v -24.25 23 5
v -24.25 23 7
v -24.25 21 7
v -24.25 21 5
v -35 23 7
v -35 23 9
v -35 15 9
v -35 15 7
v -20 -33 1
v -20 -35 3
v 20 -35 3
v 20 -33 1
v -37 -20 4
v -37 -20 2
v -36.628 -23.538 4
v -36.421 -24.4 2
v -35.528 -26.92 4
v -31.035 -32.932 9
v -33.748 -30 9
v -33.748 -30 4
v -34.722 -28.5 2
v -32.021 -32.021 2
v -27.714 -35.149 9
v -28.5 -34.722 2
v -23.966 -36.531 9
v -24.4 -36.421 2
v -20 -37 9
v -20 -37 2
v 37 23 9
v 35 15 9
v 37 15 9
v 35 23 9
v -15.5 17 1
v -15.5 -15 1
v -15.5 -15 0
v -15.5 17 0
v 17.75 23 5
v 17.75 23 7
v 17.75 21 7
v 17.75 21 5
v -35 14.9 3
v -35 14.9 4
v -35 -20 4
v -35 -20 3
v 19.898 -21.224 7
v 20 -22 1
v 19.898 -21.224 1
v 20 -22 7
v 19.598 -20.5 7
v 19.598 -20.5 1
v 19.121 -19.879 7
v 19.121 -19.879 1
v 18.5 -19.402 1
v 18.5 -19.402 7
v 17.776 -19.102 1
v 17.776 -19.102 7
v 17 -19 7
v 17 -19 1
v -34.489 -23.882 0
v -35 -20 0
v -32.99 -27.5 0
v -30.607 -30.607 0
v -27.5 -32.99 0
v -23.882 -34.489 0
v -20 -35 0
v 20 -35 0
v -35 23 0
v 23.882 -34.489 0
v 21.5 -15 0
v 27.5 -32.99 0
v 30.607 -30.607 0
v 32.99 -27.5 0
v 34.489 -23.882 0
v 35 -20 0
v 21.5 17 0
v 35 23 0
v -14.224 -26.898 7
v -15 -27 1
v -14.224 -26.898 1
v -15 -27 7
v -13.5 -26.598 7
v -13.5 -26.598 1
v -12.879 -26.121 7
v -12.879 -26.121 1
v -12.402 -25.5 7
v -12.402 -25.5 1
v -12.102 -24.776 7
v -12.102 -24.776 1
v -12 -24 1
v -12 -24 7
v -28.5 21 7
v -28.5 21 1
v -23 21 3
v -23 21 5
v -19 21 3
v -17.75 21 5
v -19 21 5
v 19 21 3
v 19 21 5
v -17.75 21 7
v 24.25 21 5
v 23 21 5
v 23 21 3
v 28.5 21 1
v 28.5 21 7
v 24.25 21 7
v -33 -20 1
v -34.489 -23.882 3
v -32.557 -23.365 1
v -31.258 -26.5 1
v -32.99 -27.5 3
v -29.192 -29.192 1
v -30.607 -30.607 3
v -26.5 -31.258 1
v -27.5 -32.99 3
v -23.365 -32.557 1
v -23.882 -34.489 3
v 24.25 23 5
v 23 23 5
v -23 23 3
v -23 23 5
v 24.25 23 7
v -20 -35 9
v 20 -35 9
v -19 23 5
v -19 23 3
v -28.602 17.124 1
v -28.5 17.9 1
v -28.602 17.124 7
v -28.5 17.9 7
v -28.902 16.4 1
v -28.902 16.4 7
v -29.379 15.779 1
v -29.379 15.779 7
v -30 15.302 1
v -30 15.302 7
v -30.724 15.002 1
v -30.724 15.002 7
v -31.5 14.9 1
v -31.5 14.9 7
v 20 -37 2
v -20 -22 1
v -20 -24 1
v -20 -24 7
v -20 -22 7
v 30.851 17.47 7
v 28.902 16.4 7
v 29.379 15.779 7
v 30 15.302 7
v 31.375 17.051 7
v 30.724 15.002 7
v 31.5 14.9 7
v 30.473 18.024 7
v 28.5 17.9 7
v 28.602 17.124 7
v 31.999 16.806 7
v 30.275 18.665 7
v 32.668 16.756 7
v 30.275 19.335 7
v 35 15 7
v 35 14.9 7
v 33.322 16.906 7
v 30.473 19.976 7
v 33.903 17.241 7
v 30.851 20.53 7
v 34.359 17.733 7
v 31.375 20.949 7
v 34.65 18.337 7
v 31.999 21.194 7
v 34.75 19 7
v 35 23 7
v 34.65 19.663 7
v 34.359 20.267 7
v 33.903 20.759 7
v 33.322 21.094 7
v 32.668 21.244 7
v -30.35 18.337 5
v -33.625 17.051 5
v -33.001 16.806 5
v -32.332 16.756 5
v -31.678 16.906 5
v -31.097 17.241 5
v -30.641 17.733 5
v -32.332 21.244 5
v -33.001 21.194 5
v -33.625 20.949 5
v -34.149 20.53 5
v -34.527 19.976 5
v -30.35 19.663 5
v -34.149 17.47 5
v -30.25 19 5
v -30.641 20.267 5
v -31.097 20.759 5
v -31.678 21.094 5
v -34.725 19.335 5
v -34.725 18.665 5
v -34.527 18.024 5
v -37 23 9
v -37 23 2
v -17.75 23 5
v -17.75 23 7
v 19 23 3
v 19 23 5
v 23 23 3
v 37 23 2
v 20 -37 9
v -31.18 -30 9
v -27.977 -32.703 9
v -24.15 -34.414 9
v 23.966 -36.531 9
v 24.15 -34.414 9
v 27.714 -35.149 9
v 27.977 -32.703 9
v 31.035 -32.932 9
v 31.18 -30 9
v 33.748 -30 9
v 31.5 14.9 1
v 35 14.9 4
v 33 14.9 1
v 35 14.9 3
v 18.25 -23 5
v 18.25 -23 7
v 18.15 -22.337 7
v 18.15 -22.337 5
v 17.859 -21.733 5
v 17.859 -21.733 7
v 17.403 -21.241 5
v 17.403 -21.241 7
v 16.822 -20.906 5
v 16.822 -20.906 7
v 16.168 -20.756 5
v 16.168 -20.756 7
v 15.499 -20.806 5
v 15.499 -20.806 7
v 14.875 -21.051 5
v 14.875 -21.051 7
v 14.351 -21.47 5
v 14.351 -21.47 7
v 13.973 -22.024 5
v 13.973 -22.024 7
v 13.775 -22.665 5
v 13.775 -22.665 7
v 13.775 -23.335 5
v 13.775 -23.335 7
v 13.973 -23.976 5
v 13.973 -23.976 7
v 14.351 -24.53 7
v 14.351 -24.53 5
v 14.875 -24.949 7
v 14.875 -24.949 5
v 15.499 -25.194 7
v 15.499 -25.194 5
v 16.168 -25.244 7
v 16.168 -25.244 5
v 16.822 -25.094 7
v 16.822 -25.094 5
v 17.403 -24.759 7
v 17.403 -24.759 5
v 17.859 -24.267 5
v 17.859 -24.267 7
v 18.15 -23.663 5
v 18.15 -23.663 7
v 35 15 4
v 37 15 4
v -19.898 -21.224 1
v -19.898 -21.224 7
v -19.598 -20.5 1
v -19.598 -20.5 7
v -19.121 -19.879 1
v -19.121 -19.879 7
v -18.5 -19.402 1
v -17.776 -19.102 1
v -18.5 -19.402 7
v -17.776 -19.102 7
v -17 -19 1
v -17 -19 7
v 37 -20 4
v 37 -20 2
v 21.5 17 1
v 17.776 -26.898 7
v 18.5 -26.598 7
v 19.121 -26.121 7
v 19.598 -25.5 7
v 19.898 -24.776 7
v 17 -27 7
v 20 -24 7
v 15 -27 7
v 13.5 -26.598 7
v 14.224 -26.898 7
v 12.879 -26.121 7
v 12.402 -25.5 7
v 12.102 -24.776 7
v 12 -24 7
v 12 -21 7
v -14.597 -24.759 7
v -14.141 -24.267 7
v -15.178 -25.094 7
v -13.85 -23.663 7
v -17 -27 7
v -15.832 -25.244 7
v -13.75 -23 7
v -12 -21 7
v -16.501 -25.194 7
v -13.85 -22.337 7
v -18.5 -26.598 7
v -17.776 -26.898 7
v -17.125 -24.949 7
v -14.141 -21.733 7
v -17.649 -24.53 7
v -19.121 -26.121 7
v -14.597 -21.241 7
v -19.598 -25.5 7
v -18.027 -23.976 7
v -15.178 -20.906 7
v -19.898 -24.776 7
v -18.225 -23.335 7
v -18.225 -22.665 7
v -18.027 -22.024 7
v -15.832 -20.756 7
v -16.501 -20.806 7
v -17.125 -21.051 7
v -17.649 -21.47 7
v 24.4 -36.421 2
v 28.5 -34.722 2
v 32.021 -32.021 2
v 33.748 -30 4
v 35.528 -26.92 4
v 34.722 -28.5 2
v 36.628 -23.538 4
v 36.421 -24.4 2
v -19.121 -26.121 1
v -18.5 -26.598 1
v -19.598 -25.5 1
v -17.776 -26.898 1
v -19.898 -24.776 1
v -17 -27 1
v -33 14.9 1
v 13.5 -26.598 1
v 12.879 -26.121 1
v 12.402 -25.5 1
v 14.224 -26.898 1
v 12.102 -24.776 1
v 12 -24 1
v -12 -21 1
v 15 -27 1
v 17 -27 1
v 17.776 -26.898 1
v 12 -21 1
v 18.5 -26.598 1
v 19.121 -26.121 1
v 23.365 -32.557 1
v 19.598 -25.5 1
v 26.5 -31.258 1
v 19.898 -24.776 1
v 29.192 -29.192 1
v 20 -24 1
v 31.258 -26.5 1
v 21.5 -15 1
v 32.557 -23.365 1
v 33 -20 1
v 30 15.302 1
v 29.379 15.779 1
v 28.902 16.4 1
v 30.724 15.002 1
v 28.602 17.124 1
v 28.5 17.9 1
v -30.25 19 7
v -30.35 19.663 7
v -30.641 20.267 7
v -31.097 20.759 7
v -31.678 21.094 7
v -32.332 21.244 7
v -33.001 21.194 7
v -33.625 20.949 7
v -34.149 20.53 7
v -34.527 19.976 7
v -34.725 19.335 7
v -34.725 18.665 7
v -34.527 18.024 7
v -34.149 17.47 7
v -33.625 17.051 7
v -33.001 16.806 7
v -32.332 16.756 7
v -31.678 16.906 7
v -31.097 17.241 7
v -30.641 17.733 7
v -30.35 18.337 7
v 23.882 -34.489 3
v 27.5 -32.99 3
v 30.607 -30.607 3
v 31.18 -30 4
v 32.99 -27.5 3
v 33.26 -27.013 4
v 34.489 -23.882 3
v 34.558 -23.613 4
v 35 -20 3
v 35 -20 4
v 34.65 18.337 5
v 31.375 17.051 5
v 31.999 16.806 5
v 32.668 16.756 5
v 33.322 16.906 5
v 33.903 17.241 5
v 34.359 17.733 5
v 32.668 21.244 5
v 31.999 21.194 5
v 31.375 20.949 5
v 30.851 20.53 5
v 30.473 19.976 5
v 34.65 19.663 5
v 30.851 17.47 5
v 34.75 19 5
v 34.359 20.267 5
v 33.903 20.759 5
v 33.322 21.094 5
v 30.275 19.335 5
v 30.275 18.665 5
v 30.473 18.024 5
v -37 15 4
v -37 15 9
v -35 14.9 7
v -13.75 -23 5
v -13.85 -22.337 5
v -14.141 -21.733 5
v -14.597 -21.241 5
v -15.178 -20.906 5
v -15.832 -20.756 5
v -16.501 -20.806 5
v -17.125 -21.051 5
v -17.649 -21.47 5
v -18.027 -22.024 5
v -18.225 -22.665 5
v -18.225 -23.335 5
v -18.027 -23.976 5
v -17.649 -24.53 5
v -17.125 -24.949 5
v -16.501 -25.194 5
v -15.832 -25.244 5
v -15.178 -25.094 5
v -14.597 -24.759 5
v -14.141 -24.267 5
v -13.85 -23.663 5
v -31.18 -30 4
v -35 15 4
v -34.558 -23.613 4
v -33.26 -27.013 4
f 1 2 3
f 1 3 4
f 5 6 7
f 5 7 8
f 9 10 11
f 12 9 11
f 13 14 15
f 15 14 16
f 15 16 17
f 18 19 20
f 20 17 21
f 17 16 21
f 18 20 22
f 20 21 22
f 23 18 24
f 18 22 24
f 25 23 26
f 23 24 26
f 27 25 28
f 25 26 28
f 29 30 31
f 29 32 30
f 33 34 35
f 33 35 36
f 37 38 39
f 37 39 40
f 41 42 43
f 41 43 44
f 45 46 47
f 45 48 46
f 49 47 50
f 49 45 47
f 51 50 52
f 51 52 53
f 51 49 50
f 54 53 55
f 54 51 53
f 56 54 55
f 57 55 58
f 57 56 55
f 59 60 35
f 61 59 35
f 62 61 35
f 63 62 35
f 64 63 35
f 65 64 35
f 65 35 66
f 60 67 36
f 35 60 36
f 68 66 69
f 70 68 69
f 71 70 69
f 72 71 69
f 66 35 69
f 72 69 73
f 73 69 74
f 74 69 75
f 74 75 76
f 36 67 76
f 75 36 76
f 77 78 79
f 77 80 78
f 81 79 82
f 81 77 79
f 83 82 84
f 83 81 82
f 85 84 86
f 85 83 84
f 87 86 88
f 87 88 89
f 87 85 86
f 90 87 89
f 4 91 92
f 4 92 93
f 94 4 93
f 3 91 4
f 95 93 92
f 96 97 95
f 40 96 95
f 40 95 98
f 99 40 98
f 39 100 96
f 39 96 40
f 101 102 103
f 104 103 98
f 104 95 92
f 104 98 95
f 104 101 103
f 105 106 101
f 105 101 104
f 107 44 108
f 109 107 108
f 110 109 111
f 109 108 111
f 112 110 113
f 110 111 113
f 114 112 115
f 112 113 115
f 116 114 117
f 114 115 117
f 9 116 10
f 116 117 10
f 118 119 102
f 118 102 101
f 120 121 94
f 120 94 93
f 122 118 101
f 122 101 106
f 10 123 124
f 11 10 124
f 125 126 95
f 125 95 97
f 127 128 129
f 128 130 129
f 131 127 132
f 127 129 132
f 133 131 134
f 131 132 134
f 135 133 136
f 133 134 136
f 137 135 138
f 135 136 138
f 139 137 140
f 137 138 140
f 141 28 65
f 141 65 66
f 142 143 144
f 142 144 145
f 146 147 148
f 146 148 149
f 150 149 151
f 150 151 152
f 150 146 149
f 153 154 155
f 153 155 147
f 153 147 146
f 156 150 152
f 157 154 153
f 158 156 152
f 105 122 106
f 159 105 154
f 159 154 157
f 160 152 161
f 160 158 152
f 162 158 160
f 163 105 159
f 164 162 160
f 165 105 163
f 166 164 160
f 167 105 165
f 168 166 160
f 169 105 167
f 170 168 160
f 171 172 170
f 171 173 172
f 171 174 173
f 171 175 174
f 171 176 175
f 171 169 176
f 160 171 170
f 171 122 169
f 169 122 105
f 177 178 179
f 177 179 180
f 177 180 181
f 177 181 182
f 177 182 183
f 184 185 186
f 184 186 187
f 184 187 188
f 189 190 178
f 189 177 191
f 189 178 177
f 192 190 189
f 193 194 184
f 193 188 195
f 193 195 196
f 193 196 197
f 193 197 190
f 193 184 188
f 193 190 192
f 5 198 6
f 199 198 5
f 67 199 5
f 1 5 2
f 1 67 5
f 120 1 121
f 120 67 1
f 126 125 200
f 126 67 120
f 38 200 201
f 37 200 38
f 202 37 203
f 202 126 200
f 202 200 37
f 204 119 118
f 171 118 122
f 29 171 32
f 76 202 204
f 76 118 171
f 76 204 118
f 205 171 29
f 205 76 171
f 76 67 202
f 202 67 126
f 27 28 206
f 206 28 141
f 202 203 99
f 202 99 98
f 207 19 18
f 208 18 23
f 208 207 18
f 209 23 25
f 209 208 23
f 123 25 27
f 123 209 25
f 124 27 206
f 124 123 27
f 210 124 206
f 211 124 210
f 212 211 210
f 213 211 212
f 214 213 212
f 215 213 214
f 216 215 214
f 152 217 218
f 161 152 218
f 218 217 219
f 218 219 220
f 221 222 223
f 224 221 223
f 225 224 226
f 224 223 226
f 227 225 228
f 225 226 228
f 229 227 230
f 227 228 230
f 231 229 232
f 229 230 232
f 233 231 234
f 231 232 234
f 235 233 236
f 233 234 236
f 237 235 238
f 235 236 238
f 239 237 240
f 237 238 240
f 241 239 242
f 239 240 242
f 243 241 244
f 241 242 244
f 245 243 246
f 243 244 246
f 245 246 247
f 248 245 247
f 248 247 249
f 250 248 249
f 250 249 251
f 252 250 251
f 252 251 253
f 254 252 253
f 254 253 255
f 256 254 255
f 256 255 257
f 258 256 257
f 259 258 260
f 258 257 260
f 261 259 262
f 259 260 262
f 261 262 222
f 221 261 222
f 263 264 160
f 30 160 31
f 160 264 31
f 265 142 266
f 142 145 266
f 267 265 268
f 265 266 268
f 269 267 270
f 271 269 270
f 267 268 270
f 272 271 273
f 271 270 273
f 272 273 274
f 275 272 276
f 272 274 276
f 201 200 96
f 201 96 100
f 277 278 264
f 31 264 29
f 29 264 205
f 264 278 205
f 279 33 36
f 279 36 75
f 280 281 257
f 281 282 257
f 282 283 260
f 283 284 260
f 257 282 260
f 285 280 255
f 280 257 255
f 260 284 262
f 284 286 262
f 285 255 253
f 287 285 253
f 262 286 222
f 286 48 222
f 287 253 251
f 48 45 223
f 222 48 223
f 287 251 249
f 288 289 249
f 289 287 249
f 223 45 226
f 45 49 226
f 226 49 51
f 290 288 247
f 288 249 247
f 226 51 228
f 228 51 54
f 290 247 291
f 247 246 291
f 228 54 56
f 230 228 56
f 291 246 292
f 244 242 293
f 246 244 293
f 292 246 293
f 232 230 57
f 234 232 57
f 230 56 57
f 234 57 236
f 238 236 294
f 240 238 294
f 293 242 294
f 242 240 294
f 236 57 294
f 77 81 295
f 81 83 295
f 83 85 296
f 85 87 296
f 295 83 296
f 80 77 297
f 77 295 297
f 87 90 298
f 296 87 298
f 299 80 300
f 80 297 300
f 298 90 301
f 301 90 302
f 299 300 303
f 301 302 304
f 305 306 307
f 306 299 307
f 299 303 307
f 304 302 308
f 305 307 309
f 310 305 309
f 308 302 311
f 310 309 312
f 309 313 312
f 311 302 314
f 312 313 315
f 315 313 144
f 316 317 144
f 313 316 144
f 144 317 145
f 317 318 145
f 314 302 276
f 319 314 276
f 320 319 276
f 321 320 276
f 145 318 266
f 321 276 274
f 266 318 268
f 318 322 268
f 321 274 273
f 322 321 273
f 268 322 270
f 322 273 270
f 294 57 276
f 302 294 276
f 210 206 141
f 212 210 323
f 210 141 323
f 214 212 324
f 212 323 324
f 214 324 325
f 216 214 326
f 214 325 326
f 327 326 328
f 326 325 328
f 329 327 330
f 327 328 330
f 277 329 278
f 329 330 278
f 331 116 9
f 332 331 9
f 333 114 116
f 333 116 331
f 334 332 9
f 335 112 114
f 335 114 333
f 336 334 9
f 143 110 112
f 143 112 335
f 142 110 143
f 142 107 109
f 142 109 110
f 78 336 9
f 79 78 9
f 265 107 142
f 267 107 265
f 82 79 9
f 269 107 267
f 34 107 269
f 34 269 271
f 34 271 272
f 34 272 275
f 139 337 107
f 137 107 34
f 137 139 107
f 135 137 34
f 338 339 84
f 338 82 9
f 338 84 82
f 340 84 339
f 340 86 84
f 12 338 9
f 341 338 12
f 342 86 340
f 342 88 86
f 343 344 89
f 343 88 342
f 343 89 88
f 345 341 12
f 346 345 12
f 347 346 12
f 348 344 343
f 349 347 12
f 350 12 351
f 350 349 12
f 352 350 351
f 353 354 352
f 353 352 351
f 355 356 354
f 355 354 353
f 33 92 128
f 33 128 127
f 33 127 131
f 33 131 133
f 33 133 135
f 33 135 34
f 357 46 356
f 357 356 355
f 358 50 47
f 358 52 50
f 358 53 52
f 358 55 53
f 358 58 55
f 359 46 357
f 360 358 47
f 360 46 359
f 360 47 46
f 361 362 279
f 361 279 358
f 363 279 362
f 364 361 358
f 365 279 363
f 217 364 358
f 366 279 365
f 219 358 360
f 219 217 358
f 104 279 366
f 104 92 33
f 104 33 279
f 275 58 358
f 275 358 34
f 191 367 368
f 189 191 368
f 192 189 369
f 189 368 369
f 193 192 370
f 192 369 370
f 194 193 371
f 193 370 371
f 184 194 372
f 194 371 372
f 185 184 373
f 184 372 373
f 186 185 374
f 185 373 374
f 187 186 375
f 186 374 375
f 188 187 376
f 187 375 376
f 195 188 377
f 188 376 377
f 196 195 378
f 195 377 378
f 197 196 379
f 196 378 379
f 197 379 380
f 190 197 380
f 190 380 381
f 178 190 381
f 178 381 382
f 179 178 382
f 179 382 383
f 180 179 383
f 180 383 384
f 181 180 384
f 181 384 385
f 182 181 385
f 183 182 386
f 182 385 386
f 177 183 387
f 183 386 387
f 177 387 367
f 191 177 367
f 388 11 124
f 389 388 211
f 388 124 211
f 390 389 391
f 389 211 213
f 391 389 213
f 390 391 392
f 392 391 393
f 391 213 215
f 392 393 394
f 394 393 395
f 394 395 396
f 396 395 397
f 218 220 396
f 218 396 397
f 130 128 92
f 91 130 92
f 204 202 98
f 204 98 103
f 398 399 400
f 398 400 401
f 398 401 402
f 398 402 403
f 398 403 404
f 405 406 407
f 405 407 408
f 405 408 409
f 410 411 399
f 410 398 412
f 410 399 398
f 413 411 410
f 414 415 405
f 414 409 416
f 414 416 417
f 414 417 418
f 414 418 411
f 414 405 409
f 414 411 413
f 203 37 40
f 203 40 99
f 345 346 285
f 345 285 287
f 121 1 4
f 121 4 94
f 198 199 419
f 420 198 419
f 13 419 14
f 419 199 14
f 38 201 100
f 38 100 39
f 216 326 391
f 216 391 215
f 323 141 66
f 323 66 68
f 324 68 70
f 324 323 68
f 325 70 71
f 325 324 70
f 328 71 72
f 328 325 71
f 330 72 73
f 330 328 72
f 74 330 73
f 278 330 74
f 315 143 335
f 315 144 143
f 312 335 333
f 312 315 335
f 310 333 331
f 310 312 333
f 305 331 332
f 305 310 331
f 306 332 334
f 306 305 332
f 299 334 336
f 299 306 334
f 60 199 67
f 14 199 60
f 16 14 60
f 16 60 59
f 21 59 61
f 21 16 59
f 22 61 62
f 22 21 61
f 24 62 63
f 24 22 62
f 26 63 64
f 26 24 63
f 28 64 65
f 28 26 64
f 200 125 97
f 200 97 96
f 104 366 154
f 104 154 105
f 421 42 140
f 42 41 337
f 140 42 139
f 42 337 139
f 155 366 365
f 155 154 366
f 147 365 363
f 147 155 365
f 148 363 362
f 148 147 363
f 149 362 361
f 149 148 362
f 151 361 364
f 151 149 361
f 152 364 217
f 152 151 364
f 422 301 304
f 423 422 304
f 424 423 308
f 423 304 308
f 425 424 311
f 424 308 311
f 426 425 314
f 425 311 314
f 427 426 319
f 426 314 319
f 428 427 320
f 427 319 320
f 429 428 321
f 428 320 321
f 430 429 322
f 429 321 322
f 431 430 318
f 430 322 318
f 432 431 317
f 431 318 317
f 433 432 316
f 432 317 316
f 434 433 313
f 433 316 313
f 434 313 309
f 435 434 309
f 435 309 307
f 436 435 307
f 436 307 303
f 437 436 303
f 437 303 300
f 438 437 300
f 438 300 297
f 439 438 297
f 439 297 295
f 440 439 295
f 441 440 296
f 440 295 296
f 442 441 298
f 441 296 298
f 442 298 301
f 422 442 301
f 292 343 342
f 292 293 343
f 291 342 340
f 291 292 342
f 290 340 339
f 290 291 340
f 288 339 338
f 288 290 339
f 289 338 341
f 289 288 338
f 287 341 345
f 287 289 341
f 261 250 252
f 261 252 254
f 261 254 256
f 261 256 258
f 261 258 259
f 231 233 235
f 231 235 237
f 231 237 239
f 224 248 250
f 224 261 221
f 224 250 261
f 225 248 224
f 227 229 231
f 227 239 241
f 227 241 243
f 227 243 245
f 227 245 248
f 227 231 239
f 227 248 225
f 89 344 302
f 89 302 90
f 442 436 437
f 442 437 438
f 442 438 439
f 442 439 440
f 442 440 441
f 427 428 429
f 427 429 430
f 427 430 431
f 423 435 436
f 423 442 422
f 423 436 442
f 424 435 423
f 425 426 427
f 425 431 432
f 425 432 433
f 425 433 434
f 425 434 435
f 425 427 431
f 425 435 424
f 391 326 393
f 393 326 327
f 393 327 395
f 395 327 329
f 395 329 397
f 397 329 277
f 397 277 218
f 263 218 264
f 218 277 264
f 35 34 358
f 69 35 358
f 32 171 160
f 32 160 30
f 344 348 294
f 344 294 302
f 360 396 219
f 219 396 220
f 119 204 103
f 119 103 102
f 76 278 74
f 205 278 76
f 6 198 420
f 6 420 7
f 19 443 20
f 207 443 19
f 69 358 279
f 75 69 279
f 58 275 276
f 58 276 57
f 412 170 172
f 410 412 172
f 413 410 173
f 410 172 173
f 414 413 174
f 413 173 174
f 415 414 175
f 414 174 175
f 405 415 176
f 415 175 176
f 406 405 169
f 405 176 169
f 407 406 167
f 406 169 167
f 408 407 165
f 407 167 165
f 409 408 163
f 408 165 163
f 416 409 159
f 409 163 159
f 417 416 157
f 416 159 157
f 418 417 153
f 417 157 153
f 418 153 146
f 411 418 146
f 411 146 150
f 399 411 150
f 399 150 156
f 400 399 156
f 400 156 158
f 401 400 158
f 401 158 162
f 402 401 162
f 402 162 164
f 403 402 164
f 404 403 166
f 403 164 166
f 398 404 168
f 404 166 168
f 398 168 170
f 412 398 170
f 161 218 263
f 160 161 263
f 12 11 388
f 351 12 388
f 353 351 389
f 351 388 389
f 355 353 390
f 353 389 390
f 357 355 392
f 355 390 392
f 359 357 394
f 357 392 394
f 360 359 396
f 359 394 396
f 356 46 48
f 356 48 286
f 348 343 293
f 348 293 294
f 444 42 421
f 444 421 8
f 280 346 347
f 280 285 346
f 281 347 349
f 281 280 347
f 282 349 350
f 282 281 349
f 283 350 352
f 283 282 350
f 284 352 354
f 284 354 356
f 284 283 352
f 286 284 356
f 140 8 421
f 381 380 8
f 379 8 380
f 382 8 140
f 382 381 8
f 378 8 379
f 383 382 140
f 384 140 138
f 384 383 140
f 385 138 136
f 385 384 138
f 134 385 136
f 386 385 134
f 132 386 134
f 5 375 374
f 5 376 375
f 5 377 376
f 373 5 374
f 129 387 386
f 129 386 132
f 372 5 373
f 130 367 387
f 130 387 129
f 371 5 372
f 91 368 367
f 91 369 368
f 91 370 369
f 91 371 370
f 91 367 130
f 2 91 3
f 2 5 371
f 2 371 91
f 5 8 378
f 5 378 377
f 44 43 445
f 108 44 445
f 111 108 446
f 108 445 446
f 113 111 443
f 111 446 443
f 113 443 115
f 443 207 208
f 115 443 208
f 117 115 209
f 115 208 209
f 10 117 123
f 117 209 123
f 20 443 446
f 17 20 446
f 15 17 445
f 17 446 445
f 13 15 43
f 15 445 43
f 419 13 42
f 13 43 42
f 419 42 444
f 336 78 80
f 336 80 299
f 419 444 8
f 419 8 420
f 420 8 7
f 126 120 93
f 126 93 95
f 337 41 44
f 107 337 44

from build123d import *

# Parameters (mm, degrees)
PAD_DEPTH       = 9
POCKET_DEPTH    = 8
SKETCH002_W     = 37
SKETCH002_H     = 32
POCKET001_DEPTH = 1.001
POCKET002_DEPTH = 5
SKETCH004_W     = 45
SKETCH004_H     = 5
POCKET003_DEPTH = 74.001
SKETCH005_W     = 6.5
SKETCH005_H     = 8
PAD001_DEPTH    = 6
SKETCH006_R     = 2.25
POCKET004_DEPTH = 2
CHAMFER_SIZE    = 2
CHAMFER001_SIZE = 2
FILLET_R        = 3


with BuildPart() as part:
    # Sketch → Pad (new body)
    with BuildSketch(Plane.XY):
        with BuildLine():
            Line((-37, 23), (-37, -20))
            ThreePointArc((-37, -20), (-32.020815, -32.020815), (-20, -37))
            Line((-20, -37), (20.000003, -37))
            ThreePointArc((20.000003, -37), (32.020816, -32.020814), (37, -20))
            Line((37, -20), (37, 23))
            Line((-37, 23), (37, 23))
        make_face()
    extrude(amount=PAD_DEPTH)

    # Sketch001 (on Face8 of Pad) → Pocket (cut)
    with BuildSketch(Plane.XY.offset(9)):
        with BuildLine():
            Line((-35, 21), (-35, -20))
            ThreePointArc((-35, -20), (-30.606602, -30.606602), (-20, -35))
            Line((-20, -35), (20, -35))
            ThreePointArc((20, -35), (30.606602, -30.606602), (35, -20))
            Line((35, 21), (35, -20))
            Line((-35, 21), (35, 21))
        make_face()
    extrude(amount=-POCKET_DEPTH, mode=Mode.SUBTRACT)

    # Sketch002 (on Face15 of Pocket) → Pocket001 (cut, through all)
    with BuildSketch(Plane.XY.offset(1)):
        with Locations((3, 1)):
            Rectangle(SKETCH002_W, SKETCH002_H)
    extrude(amount=-POCKET001_DEPTH, mode=Mode.SUBTRACT)

    # Sketch003 (on Face2 of Pocket001) → Pocket002 (cut)
    with BuildSketch(Plane(origin=(0, 23, 0), x_dir=(-1, 0, 0), z_dir=(0, 1, 0))):
        Polygon((-35, 9), (35, 9), (35, 7), (24.25, 7), (24.25, 5), (23, 5), (23, 3), (19, 3), (19, 5), (17.75, 5), (17.75, 7), (-17.75, 7), (-17.75, 5), (-19, 5), (-19, 3), (-23, 3), (-23, 5), (-24.25, 5), (-24.25, 7), (-35, 7), align=None)
    extrude(amount=-POCKET002_DEPTH, mode=Mode.SUBTRACT)

    # Sketch004 → Pocket003 (cut, through all)
    with BuildSketch(Plane.YZ.offset(37)):
        with Locations((-7.5, 6.5)):
            Rectangle(SKETCH004_W, SKETCH004_H)
    extrude(amount=-POCKET003_DEPTH, mode=Mode.SUBTRACT)

    # Sketch005 (on Face43 of Pocket003) → Pad001 (join)
    with BuildSketch(Plane.XY.offset(1)):
        Polygon((-20, -19), (20, -19), (20, -27), (12, -27), (12, -21), (-12, -21), (-12, -27), (-20, -27), align=None)
        with Locations((-31.75, 18.9)):
            Rectangle(SKETCH005_W, SKETCH005_H)
        with Locations((31.75, 18.9)):
            Rectangle(SKETCH005_W, SKETCH005_H)
    extrude(amount=PAD001_DEPTH)

    # Sketch006 (on Face69 of Pad001) → Pocket004 (cut)
    with BuildSketch(Plane.XY.offset(7)):
        with Locations((-16, -23)):
            Circle(SKETCH006_R)
        with Locations((16, -23)):
            Circle(SKETCH006_R)
        with Locations((-32.5, 19)):
            Circle(SKETCH006_R)
        with Locations((32.5, 19)):
            Circle(SKETCH006_R)
    extrude(amount=-POCKET004_DEPTH, mode=Mode.SUBTRACT)

    # Chamfer
    chamfer_edges = [part.edges().sort_by_distance(p)[0] for p in [
        (-35, -2.55, 1),
    ]]
    chamfer(chamfer_edges, length=CHAMFER_SIZE)

    # Chamfer001
    chamfer001_edges = [part.edges().sort_by_distance(p)[0] for p in [
        (32.020816, -32.020814, 0),
    ]]
    chamfer(chamfer001_edges, length=CHAMFER001_SIZE)

    # Fillet
    fillet_edges = [part.edges().sort_by_distance(p)[0] for p in [
        (-28.5, 14.9, 4),
        (28.5, 14.9, 4),
        (20, -27, 4),
        (12, -27, 4),
        (-12, -27, 4),
        (-20, -27, 4),
        (-20, -19, 4),
        (20, -19, 4),
    ]]
    fillet(fillet_edges, radius=FILLET_R)


solid = part.part
